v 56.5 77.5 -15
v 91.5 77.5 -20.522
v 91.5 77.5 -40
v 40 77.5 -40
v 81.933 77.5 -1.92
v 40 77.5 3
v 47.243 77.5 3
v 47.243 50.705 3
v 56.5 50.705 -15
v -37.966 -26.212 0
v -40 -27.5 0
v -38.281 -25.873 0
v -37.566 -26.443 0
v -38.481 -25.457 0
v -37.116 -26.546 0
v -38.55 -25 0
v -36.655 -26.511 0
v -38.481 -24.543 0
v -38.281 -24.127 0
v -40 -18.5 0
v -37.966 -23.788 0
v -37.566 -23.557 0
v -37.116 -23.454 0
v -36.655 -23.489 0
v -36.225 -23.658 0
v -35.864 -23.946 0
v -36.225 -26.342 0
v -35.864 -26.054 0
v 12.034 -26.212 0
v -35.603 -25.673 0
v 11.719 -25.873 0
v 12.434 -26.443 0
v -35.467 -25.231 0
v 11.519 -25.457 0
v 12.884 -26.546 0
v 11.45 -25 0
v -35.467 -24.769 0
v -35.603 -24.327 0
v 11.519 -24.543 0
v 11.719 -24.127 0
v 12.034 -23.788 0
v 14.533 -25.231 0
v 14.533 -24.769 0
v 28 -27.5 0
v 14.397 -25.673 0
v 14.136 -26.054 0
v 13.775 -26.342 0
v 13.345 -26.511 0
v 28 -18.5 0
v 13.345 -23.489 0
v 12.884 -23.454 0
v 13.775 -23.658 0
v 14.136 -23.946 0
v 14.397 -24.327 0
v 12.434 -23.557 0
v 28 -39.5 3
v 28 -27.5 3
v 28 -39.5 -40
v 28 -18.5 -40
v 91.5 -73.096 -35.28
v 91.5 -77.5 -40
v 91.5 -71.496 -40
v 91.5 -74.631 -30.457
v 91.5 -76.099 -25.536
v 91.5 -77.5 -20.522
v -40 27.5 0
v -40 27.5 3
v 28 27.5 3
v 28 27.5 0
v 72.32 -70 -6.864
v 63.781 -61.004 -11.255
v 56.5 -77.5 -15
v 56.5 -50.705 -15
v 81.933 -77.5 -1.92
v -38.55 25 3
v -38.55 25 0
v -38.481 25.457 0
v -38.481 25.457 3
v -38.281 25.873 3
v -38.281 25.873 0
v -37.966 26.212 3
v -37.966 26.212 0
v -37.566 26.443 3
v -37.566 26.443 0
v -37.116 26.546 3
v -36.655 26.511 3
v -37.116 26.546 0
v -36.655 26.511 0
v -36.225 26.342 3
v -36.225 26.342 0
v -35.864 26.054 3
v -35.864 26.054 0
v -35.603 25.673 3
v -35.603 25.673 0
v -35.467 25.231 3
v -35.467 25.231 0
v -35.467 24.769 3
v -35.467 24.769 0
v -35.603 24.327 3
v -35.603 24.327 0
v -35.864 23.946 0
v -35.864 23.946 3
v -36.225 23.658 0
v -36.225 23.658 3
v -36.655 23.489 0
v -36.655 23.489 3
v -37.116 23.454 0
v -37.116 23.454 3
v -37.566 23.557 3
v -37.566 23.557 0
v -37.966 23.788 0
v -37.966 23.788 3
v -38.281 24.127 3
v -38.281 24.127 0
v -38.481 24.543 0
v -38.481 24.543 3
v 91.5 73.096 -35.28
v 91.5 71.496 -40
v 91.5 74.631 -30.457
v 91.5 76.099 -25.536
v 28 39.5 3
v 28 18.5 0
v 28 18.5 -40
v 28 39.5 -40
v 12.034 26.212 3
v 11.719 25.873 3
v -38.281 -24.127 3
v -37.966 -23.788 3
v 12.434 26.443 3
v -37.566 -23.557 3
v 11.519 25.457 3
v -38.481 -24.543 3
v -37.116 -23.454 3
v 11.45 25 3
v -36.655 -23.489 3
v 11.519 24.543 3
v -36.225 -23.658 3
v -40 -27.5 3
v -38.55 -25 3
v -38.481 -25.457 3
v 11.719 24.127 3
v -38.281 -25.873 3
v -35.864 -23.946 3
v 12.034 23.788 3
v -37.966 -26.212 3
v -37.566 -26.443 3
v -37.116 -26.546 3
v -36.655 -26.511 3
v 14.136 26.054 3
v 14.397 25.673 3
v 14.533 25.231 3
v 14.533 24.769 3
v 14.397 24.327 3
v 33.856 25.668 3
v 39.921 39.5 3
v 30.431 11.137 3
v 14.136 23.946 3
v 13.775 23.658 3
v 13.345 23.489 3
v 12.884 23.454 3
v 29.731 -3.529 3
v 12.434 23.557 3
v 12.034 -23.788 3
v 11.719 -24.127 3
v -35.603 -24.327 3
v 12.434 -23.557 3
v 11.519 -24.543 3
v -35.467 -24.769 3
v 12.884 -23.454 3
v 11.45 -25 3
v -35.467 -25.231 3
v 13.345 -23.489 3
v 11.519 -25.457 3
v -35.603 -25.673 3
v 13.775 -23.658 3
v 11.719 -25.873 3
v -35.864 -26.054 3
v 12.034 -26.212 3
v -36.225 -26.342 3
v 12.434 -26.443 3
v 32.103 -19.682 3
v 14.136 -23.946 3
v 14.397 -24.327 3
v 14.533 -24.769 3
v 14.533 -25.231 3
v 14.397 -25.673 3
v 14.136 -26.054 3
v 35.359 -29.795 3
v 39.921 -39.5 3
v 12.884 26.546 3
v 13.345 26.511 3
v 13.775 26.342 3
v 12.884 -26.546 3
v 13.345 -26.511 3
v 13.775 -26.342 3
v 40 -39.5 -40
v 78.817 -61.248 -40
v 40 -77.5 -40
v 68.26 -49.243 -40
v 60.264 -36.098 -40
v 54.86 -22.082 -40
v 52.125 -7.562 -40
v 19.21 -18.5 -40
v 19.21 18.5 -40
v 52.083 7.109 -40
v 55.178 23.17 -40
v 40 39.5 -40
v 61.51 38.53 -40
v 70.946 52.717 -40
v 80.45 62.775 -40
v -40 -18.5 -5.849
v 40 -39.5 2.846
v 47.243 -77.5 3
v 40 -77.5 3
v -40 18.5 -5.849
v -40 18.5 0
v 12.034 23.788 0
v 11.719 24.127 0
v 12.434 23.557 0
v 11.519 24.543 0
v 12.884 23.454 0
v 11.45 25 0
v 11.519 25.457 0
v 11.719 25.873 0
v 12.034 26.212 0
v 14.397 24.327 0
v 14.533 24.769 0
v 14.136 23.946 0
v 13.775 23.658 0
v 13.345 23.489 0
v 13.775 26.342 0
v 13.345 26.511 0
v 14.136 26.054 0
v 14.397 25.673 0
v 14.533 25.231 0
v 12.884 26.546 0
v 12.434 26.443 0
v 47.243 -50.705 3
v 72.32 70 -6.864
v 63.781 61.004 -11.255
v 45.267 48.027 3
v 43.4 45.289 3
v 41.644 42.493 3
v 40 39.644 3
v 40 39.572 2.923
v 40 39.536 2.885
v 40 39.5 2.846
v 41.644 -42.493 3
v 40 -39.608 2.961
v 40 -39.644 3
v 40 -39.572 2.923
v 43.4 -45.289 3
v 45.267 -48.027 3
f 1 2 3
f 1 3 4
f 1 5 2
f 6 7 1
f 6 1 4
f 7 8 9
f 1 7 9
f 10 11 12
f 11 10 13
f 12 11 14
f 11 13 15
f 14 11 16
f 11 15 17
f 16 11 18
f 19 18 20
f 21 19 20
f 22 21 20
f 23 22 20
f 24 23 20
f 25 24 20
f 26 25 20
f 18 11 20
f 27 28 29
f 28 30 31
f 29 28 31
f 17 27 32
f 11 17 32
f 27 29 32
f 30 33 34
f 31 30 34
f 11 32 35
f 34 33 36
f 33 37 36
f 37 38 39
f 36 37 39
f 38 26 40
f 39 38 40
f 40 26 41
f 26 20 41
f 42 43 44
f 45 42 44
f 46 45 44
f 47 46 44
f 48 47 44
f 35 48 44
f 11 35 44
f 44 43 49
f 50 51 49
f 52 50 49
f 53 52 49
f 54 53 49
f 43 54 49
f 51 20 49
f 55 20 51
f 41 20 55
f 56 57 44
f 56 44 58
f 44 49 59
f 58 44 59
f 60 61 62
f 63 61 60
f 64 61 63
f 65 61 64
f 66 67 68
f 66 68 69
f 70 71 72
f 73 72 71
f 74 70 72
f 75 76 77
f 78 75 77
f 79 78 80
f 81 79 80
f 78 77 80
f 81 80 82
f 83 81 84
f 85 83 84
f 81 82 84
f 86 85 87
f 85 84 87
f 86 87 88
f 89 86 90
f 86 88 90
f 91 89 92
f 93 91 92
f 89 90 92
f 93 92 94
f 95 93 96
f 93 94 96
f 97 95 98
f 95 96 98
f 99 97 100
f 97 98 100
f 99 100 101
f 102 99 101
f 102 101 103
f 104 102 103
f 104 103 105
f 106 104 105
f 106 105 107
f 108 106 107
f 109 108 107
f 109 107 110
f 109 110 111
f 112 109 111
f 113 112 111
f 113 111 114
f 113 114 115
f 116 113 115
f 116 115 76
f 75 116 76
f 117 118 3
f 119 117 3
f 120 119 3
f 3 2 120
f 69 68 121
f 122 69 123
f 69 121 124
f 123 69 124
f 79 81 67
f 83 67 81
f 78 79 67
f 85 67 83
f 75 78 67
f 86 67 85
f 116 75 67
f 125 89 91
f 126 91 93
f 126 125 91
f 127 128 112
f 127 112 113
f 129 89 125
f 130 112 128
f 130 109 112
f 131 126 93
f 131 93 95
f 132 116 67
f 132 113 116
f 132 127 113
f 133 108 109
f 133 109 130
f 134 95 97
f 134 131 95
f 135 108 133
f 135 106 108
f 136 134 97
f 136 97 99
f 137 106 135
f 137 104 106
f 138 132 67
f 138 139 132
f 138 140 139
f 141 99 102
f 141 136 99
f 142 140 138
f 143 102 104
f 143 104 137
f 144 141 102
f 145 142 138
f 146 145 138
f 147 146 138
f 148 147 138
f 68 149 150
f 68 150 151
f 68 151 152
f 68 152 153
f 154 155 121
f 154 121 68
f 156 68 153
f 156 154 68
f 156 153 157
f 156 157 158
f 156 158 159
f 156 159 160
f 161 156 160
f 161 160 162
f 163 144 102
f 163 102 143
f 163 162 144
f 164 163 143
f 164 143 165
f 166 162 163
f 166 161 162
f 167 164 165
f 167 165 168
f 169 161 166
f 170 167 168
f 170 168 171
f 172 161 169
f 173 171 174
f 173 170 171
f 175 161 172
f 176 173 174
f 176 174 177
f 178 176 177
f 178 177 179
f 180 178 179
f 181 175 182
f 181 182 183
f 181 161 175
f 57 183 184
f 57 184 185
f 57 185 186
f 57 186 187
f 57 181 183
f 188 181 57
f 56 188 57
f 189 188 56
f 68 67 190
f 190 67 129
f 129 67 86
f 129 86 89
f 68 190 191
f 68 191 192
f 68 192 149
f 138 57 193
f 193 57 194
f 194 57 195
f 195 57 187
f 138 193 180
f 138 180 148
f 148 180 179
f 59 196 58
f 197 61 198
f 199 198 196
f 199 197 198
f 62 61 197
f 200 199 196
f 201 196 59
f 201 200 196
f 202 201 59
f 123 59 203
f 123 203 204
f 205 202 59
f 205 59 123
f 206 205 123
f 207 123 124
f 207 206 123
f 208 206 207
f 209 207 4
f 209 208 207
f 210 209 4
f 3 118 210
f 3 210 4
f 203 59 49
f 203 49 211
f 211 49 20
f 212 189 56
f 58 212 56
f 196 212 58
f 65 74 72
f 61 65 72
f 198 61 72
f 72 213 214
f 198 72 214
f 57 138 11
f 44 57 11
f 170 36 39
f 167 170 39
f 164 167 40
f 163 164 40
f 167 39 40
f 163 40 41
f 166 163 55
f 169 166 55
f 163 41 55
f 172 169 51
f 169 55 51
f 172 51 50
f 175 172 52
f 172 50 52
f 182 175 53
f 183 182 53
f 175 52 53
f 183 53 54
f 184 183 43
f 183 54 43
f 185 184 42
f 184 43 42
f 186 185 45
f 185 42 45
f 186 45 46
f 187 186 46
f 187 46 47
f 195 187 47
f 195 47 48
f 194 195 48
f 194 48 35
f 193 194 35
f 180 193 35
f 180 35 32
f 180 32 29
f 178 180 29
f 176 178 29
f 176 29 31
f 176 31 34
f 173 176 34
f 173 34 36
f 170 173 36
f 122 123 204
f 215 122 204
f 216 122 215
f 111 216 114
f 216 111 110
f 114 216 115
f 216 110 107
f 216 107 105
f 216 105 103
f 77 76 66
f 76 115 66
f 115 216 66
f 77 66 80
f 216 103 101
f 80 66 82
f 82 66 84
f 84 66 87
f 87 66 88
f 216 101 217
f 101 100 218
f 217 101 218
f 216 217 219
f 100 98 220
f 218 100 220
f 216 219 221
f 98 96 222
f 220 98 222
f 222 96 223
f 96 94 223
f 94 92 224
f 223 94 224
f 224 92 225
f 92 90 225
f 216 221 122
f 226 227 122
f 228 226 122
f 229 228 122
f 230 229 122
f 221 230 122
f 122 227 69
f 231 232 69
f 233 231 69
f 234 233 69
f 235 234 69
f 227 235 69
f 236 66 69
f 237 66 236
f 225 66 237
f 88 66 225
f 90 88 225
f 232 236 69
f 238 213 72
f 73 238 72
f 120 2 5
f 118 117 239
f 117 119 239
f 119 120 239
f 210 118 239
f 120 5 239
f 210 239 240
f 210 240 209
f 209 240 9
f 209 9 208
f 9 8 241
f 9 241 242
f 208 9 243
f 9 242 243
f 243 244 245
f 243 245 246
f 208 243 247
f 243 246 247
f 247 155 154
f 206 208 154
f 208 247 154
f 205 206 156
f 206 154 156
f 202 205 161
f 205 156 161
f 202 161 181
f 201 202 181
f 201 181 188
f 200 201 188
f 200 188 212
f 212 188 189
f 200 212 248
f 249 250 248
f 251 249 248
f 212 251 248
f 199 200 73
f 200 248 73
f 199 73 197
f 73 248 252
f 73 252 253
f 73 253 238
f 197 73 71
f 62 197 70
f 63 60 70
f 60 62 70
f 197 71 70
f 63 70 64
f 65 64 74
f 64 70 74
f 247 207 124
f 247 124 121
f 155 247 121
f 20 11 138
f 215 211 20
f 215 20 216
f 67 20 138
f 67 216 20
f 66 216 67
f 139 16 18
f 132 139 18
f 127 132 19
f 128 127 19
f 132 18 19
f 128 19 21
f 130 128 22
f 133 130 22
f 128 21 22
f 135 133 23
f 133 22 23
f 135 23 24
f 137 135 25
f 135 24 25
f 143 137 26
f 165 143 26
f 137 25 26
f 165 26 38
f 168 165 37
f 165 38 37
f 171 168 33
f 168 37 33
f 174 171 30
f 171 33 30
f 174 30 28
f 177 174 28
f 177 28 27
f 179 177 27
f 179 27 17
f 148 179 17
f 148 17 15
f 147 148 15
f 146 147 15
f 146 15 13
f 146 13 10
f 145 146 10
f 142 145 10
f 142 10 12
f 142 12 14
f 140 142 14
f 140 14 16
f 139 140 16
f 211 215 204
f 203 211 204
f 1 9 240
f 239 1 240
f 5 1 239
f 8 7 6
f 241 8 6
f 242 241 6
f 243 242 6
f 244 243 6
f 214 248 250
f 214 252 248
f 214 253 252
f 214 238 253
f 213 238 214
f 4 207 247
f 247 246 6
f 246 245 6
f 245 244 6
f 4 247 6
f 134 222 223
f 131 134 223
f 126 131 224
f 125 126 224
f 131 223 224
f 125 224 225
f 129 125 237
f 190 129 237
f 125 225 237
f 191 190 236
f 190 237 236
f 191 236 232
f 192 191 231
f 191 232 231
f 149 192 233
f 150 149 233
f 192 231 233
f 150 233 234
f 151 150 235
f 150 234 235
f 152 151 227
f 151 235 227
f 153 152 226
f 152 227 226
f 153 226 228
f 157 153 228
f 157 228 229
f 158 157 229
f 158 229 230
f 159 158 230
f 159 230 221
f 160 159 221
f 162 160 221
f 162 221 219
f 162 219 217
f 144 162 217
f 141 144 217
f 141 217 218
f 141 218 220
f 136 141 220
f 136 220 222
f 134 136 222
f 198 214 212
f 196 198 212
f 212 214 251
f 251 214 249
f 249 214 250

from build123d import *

# Parameters (mm, degrees)
SKETCH_1_W          = 80
SKETCH_1_H          = 55
EXTRUDE_1_DEPTH     = 3
SKETCH_2_R          = 1.55
CUT_EXTRUDE_1_DEPTH = 24.5
SKETCH_3_W          = 3
SKETCH_3_H          = 55
EXTRUDE_2_DEPTH     = 1.5
SKETCH_5_W          = 3
SKETCH_5_H          = 55
EXTRUDE_3_DEPTH     = 50
SKETCH_6_W          = 51.5
SKETCH_6_H          = 3
EXTRUDE_4_DEPTH     = 50
SKETCH_7_W          = 51.5
SKETCH_7_H          = 3
EXTRUDE_5_DEPTH     = 50
SKETCH_8_W          = 51.5
SKETCH_8_H          = 155
EXTRUDE_6_DEPTH     = 40
EXTRUDE_7_DEPTH     = 12
CUT_EXTRUDE_2_DEPTH = 184
SKETCH_13_R         = 90
CUT_EXTRUDE_3_DEPTH = 92
SKETCH_14_W         = 68
SKETCH_14_H         = 37
EXTRUDE_8_DEPTH     = 40
CUT_EXTRUDE_4_DEPTH = 56


with BuildPart() as part:
    # 草图1 → 凸台-拉伸1 (new body)
    with BuildSketch(Plane.XY):
        Rectangle(SKETCH_1_W, SKETCH_1_H)
    extrude(amount=EXTRUDE_1_DEPTH)

    # 草图2 → 切除-拉伸1 (cut)
    with BuildSketch(Plane(origin=(0, 0, 0), x_dir=(-1, 0, 0), z_dir=(0, 0, -1))):
        with Locations((37, 25)):
            Circle(SKETCH_2_R)
        with Locations((37, -25)):
            Circle(SKETCH_2_R)
        with Locations((-13, 25)):
            Circle(SKETCH_2_R)
        with Locations((-13, -25)):
            Circle(SKETCH_2_R)
    extrude(amount=-CUT_EXTRUDE_1_DEPTH, mode=Mode.SUBTRACT)



with BuildPart() as body_2:
    # 草图3 → 凸台-拉伸2 (new body)
    with BuildSketch(Plane(origin=(40, 0, 0), x_dir=(0, 0, -1), z_dir=(1, 0, 0))):
        with Locations((-1.5, 0)):
            Rectangle(SKETCH_3_W, SKETCH_3_H)
    extrude(amount=EXTRUDE_2_DEPTH)

    # 草图5 → 凸台-拉伸3 (add)
    with BuildSketch(Plane(origin=(41.5, 0, 0), x_dir=(0, 0, -1), z_dir=(1, 0, 0))):
        with Locations((-1.5, 0)):
            Rectangle(SKETCH_5_W, SKETCH_5_H)
    extrude(amount=EXTRUDE_3_DEPTH)


with BuildPart() as part_1:
    add(part.part)

    add(body_2.part)  # 凸台-拉伸4 merges body 2
    # 草图6 → 凸台-拉伸4 (add)
    with BuildSketch(Plane(origin=(0, 27.5, 0), x_dir=(1, 0, 0), z_dir=(0, 1, 0))):
        with Locations((65.75, -1.5)):
            Rectangle(SKETCH_6_W, SKETCH_6_H)
    extrude(amount=EXTRUDE_4_DEPTH)

    # 草图7 → 凸台-拉伸5 (add)
    with BuildSketch(Plane.XZ.offset(27.5)):
        with Locations((65.75, 1.5)):
            Rectangle(SKETCH_7_W, SKETCH_7_H)
    extrude(amount=EXTRUDE_5_DEPTH)

    # 草图8 → 凸台-拉伸6 (add)
    with BuildSketch(Plane(origin=(0, 0, 0), x_dir=(-1, 0, 0), z_dir=(0, 0, -1))):
        with Locations((-65.75, 0)):
            Rectangle(SKETCH_8_W, SKETCH_8_H)
    extrude(amount=EXTRUDE_6_DEPTH)

    # 草图9 → 凸台-拉伸7 (add)
    with BuildSketch(Plane.ZY.offset(-40)):
        Polygon((-40, 39.5), (3, 39.5), (3, 27.5), (0, 27.5), (0, -27.5), (3, -27.5), (3, -39.5), (-40, -39.5), align=None)
    extrude(amount=EXTRUDE_7_DEPTH)

    # 草图10 → 切除-拉伸2 (cut)
    with BuildSketch(Plane(origin=(0, 77.5, 0), x_dir=(1, 0, 0), z_dir=(0, 1, 0))):
        Polygon((56.5, 15), (91.5, -3), (47.242857143, -3), align=None)
    extrude(amount=-CUT_EXTRUDE_2_DEPTH, mode=Mode.SUBTRACT)

    # 草图13 → 切除-拉伸3 (cut, symmetric)
    with BuildSketch(Plane(origin=(17.918657198, 0, -34.841833441), x_dir=(0.889287802, 0, 0.457348013), z_dir=(-0.457348013, 0, 0.889287802))):
        with Locations((117.74187795, 0)):
            Circle(SKETCH_13_R)
    extrude(amount=CUT_EXTRUDE_3_DEPTH, both=True, mode=Mode.SUBTRACT)

    # 草图14 → 凸台-拉伸8 (add)
    with BuildSketch(Plane(origin=(0, 0, 0), x_dir=(-1, 0, 0), z_dir=(0, 0, -1))):
        with Locations((6, 0)):
            Rectangle(SKETCH_14_W, SKETCH_14_H)
    extrude(amount=EXTRUDE_8_DEPTH)

    # 草图16 → 切除-拉伸4 (cut)
    with BuildSketch(Plane(origin=(0, 18.5, 0), x_dir=(1, 0, 0), z_dir=(0, 1, 0))):
        Polygon((-40, 5.848570226), (19.210183994, 40), (-40, 40), align=None)
    extrude(amount=-CUT_EXTRUDE_4_DEPTH, mode=Mode.SUBTRACT)


solid = part_1.part
